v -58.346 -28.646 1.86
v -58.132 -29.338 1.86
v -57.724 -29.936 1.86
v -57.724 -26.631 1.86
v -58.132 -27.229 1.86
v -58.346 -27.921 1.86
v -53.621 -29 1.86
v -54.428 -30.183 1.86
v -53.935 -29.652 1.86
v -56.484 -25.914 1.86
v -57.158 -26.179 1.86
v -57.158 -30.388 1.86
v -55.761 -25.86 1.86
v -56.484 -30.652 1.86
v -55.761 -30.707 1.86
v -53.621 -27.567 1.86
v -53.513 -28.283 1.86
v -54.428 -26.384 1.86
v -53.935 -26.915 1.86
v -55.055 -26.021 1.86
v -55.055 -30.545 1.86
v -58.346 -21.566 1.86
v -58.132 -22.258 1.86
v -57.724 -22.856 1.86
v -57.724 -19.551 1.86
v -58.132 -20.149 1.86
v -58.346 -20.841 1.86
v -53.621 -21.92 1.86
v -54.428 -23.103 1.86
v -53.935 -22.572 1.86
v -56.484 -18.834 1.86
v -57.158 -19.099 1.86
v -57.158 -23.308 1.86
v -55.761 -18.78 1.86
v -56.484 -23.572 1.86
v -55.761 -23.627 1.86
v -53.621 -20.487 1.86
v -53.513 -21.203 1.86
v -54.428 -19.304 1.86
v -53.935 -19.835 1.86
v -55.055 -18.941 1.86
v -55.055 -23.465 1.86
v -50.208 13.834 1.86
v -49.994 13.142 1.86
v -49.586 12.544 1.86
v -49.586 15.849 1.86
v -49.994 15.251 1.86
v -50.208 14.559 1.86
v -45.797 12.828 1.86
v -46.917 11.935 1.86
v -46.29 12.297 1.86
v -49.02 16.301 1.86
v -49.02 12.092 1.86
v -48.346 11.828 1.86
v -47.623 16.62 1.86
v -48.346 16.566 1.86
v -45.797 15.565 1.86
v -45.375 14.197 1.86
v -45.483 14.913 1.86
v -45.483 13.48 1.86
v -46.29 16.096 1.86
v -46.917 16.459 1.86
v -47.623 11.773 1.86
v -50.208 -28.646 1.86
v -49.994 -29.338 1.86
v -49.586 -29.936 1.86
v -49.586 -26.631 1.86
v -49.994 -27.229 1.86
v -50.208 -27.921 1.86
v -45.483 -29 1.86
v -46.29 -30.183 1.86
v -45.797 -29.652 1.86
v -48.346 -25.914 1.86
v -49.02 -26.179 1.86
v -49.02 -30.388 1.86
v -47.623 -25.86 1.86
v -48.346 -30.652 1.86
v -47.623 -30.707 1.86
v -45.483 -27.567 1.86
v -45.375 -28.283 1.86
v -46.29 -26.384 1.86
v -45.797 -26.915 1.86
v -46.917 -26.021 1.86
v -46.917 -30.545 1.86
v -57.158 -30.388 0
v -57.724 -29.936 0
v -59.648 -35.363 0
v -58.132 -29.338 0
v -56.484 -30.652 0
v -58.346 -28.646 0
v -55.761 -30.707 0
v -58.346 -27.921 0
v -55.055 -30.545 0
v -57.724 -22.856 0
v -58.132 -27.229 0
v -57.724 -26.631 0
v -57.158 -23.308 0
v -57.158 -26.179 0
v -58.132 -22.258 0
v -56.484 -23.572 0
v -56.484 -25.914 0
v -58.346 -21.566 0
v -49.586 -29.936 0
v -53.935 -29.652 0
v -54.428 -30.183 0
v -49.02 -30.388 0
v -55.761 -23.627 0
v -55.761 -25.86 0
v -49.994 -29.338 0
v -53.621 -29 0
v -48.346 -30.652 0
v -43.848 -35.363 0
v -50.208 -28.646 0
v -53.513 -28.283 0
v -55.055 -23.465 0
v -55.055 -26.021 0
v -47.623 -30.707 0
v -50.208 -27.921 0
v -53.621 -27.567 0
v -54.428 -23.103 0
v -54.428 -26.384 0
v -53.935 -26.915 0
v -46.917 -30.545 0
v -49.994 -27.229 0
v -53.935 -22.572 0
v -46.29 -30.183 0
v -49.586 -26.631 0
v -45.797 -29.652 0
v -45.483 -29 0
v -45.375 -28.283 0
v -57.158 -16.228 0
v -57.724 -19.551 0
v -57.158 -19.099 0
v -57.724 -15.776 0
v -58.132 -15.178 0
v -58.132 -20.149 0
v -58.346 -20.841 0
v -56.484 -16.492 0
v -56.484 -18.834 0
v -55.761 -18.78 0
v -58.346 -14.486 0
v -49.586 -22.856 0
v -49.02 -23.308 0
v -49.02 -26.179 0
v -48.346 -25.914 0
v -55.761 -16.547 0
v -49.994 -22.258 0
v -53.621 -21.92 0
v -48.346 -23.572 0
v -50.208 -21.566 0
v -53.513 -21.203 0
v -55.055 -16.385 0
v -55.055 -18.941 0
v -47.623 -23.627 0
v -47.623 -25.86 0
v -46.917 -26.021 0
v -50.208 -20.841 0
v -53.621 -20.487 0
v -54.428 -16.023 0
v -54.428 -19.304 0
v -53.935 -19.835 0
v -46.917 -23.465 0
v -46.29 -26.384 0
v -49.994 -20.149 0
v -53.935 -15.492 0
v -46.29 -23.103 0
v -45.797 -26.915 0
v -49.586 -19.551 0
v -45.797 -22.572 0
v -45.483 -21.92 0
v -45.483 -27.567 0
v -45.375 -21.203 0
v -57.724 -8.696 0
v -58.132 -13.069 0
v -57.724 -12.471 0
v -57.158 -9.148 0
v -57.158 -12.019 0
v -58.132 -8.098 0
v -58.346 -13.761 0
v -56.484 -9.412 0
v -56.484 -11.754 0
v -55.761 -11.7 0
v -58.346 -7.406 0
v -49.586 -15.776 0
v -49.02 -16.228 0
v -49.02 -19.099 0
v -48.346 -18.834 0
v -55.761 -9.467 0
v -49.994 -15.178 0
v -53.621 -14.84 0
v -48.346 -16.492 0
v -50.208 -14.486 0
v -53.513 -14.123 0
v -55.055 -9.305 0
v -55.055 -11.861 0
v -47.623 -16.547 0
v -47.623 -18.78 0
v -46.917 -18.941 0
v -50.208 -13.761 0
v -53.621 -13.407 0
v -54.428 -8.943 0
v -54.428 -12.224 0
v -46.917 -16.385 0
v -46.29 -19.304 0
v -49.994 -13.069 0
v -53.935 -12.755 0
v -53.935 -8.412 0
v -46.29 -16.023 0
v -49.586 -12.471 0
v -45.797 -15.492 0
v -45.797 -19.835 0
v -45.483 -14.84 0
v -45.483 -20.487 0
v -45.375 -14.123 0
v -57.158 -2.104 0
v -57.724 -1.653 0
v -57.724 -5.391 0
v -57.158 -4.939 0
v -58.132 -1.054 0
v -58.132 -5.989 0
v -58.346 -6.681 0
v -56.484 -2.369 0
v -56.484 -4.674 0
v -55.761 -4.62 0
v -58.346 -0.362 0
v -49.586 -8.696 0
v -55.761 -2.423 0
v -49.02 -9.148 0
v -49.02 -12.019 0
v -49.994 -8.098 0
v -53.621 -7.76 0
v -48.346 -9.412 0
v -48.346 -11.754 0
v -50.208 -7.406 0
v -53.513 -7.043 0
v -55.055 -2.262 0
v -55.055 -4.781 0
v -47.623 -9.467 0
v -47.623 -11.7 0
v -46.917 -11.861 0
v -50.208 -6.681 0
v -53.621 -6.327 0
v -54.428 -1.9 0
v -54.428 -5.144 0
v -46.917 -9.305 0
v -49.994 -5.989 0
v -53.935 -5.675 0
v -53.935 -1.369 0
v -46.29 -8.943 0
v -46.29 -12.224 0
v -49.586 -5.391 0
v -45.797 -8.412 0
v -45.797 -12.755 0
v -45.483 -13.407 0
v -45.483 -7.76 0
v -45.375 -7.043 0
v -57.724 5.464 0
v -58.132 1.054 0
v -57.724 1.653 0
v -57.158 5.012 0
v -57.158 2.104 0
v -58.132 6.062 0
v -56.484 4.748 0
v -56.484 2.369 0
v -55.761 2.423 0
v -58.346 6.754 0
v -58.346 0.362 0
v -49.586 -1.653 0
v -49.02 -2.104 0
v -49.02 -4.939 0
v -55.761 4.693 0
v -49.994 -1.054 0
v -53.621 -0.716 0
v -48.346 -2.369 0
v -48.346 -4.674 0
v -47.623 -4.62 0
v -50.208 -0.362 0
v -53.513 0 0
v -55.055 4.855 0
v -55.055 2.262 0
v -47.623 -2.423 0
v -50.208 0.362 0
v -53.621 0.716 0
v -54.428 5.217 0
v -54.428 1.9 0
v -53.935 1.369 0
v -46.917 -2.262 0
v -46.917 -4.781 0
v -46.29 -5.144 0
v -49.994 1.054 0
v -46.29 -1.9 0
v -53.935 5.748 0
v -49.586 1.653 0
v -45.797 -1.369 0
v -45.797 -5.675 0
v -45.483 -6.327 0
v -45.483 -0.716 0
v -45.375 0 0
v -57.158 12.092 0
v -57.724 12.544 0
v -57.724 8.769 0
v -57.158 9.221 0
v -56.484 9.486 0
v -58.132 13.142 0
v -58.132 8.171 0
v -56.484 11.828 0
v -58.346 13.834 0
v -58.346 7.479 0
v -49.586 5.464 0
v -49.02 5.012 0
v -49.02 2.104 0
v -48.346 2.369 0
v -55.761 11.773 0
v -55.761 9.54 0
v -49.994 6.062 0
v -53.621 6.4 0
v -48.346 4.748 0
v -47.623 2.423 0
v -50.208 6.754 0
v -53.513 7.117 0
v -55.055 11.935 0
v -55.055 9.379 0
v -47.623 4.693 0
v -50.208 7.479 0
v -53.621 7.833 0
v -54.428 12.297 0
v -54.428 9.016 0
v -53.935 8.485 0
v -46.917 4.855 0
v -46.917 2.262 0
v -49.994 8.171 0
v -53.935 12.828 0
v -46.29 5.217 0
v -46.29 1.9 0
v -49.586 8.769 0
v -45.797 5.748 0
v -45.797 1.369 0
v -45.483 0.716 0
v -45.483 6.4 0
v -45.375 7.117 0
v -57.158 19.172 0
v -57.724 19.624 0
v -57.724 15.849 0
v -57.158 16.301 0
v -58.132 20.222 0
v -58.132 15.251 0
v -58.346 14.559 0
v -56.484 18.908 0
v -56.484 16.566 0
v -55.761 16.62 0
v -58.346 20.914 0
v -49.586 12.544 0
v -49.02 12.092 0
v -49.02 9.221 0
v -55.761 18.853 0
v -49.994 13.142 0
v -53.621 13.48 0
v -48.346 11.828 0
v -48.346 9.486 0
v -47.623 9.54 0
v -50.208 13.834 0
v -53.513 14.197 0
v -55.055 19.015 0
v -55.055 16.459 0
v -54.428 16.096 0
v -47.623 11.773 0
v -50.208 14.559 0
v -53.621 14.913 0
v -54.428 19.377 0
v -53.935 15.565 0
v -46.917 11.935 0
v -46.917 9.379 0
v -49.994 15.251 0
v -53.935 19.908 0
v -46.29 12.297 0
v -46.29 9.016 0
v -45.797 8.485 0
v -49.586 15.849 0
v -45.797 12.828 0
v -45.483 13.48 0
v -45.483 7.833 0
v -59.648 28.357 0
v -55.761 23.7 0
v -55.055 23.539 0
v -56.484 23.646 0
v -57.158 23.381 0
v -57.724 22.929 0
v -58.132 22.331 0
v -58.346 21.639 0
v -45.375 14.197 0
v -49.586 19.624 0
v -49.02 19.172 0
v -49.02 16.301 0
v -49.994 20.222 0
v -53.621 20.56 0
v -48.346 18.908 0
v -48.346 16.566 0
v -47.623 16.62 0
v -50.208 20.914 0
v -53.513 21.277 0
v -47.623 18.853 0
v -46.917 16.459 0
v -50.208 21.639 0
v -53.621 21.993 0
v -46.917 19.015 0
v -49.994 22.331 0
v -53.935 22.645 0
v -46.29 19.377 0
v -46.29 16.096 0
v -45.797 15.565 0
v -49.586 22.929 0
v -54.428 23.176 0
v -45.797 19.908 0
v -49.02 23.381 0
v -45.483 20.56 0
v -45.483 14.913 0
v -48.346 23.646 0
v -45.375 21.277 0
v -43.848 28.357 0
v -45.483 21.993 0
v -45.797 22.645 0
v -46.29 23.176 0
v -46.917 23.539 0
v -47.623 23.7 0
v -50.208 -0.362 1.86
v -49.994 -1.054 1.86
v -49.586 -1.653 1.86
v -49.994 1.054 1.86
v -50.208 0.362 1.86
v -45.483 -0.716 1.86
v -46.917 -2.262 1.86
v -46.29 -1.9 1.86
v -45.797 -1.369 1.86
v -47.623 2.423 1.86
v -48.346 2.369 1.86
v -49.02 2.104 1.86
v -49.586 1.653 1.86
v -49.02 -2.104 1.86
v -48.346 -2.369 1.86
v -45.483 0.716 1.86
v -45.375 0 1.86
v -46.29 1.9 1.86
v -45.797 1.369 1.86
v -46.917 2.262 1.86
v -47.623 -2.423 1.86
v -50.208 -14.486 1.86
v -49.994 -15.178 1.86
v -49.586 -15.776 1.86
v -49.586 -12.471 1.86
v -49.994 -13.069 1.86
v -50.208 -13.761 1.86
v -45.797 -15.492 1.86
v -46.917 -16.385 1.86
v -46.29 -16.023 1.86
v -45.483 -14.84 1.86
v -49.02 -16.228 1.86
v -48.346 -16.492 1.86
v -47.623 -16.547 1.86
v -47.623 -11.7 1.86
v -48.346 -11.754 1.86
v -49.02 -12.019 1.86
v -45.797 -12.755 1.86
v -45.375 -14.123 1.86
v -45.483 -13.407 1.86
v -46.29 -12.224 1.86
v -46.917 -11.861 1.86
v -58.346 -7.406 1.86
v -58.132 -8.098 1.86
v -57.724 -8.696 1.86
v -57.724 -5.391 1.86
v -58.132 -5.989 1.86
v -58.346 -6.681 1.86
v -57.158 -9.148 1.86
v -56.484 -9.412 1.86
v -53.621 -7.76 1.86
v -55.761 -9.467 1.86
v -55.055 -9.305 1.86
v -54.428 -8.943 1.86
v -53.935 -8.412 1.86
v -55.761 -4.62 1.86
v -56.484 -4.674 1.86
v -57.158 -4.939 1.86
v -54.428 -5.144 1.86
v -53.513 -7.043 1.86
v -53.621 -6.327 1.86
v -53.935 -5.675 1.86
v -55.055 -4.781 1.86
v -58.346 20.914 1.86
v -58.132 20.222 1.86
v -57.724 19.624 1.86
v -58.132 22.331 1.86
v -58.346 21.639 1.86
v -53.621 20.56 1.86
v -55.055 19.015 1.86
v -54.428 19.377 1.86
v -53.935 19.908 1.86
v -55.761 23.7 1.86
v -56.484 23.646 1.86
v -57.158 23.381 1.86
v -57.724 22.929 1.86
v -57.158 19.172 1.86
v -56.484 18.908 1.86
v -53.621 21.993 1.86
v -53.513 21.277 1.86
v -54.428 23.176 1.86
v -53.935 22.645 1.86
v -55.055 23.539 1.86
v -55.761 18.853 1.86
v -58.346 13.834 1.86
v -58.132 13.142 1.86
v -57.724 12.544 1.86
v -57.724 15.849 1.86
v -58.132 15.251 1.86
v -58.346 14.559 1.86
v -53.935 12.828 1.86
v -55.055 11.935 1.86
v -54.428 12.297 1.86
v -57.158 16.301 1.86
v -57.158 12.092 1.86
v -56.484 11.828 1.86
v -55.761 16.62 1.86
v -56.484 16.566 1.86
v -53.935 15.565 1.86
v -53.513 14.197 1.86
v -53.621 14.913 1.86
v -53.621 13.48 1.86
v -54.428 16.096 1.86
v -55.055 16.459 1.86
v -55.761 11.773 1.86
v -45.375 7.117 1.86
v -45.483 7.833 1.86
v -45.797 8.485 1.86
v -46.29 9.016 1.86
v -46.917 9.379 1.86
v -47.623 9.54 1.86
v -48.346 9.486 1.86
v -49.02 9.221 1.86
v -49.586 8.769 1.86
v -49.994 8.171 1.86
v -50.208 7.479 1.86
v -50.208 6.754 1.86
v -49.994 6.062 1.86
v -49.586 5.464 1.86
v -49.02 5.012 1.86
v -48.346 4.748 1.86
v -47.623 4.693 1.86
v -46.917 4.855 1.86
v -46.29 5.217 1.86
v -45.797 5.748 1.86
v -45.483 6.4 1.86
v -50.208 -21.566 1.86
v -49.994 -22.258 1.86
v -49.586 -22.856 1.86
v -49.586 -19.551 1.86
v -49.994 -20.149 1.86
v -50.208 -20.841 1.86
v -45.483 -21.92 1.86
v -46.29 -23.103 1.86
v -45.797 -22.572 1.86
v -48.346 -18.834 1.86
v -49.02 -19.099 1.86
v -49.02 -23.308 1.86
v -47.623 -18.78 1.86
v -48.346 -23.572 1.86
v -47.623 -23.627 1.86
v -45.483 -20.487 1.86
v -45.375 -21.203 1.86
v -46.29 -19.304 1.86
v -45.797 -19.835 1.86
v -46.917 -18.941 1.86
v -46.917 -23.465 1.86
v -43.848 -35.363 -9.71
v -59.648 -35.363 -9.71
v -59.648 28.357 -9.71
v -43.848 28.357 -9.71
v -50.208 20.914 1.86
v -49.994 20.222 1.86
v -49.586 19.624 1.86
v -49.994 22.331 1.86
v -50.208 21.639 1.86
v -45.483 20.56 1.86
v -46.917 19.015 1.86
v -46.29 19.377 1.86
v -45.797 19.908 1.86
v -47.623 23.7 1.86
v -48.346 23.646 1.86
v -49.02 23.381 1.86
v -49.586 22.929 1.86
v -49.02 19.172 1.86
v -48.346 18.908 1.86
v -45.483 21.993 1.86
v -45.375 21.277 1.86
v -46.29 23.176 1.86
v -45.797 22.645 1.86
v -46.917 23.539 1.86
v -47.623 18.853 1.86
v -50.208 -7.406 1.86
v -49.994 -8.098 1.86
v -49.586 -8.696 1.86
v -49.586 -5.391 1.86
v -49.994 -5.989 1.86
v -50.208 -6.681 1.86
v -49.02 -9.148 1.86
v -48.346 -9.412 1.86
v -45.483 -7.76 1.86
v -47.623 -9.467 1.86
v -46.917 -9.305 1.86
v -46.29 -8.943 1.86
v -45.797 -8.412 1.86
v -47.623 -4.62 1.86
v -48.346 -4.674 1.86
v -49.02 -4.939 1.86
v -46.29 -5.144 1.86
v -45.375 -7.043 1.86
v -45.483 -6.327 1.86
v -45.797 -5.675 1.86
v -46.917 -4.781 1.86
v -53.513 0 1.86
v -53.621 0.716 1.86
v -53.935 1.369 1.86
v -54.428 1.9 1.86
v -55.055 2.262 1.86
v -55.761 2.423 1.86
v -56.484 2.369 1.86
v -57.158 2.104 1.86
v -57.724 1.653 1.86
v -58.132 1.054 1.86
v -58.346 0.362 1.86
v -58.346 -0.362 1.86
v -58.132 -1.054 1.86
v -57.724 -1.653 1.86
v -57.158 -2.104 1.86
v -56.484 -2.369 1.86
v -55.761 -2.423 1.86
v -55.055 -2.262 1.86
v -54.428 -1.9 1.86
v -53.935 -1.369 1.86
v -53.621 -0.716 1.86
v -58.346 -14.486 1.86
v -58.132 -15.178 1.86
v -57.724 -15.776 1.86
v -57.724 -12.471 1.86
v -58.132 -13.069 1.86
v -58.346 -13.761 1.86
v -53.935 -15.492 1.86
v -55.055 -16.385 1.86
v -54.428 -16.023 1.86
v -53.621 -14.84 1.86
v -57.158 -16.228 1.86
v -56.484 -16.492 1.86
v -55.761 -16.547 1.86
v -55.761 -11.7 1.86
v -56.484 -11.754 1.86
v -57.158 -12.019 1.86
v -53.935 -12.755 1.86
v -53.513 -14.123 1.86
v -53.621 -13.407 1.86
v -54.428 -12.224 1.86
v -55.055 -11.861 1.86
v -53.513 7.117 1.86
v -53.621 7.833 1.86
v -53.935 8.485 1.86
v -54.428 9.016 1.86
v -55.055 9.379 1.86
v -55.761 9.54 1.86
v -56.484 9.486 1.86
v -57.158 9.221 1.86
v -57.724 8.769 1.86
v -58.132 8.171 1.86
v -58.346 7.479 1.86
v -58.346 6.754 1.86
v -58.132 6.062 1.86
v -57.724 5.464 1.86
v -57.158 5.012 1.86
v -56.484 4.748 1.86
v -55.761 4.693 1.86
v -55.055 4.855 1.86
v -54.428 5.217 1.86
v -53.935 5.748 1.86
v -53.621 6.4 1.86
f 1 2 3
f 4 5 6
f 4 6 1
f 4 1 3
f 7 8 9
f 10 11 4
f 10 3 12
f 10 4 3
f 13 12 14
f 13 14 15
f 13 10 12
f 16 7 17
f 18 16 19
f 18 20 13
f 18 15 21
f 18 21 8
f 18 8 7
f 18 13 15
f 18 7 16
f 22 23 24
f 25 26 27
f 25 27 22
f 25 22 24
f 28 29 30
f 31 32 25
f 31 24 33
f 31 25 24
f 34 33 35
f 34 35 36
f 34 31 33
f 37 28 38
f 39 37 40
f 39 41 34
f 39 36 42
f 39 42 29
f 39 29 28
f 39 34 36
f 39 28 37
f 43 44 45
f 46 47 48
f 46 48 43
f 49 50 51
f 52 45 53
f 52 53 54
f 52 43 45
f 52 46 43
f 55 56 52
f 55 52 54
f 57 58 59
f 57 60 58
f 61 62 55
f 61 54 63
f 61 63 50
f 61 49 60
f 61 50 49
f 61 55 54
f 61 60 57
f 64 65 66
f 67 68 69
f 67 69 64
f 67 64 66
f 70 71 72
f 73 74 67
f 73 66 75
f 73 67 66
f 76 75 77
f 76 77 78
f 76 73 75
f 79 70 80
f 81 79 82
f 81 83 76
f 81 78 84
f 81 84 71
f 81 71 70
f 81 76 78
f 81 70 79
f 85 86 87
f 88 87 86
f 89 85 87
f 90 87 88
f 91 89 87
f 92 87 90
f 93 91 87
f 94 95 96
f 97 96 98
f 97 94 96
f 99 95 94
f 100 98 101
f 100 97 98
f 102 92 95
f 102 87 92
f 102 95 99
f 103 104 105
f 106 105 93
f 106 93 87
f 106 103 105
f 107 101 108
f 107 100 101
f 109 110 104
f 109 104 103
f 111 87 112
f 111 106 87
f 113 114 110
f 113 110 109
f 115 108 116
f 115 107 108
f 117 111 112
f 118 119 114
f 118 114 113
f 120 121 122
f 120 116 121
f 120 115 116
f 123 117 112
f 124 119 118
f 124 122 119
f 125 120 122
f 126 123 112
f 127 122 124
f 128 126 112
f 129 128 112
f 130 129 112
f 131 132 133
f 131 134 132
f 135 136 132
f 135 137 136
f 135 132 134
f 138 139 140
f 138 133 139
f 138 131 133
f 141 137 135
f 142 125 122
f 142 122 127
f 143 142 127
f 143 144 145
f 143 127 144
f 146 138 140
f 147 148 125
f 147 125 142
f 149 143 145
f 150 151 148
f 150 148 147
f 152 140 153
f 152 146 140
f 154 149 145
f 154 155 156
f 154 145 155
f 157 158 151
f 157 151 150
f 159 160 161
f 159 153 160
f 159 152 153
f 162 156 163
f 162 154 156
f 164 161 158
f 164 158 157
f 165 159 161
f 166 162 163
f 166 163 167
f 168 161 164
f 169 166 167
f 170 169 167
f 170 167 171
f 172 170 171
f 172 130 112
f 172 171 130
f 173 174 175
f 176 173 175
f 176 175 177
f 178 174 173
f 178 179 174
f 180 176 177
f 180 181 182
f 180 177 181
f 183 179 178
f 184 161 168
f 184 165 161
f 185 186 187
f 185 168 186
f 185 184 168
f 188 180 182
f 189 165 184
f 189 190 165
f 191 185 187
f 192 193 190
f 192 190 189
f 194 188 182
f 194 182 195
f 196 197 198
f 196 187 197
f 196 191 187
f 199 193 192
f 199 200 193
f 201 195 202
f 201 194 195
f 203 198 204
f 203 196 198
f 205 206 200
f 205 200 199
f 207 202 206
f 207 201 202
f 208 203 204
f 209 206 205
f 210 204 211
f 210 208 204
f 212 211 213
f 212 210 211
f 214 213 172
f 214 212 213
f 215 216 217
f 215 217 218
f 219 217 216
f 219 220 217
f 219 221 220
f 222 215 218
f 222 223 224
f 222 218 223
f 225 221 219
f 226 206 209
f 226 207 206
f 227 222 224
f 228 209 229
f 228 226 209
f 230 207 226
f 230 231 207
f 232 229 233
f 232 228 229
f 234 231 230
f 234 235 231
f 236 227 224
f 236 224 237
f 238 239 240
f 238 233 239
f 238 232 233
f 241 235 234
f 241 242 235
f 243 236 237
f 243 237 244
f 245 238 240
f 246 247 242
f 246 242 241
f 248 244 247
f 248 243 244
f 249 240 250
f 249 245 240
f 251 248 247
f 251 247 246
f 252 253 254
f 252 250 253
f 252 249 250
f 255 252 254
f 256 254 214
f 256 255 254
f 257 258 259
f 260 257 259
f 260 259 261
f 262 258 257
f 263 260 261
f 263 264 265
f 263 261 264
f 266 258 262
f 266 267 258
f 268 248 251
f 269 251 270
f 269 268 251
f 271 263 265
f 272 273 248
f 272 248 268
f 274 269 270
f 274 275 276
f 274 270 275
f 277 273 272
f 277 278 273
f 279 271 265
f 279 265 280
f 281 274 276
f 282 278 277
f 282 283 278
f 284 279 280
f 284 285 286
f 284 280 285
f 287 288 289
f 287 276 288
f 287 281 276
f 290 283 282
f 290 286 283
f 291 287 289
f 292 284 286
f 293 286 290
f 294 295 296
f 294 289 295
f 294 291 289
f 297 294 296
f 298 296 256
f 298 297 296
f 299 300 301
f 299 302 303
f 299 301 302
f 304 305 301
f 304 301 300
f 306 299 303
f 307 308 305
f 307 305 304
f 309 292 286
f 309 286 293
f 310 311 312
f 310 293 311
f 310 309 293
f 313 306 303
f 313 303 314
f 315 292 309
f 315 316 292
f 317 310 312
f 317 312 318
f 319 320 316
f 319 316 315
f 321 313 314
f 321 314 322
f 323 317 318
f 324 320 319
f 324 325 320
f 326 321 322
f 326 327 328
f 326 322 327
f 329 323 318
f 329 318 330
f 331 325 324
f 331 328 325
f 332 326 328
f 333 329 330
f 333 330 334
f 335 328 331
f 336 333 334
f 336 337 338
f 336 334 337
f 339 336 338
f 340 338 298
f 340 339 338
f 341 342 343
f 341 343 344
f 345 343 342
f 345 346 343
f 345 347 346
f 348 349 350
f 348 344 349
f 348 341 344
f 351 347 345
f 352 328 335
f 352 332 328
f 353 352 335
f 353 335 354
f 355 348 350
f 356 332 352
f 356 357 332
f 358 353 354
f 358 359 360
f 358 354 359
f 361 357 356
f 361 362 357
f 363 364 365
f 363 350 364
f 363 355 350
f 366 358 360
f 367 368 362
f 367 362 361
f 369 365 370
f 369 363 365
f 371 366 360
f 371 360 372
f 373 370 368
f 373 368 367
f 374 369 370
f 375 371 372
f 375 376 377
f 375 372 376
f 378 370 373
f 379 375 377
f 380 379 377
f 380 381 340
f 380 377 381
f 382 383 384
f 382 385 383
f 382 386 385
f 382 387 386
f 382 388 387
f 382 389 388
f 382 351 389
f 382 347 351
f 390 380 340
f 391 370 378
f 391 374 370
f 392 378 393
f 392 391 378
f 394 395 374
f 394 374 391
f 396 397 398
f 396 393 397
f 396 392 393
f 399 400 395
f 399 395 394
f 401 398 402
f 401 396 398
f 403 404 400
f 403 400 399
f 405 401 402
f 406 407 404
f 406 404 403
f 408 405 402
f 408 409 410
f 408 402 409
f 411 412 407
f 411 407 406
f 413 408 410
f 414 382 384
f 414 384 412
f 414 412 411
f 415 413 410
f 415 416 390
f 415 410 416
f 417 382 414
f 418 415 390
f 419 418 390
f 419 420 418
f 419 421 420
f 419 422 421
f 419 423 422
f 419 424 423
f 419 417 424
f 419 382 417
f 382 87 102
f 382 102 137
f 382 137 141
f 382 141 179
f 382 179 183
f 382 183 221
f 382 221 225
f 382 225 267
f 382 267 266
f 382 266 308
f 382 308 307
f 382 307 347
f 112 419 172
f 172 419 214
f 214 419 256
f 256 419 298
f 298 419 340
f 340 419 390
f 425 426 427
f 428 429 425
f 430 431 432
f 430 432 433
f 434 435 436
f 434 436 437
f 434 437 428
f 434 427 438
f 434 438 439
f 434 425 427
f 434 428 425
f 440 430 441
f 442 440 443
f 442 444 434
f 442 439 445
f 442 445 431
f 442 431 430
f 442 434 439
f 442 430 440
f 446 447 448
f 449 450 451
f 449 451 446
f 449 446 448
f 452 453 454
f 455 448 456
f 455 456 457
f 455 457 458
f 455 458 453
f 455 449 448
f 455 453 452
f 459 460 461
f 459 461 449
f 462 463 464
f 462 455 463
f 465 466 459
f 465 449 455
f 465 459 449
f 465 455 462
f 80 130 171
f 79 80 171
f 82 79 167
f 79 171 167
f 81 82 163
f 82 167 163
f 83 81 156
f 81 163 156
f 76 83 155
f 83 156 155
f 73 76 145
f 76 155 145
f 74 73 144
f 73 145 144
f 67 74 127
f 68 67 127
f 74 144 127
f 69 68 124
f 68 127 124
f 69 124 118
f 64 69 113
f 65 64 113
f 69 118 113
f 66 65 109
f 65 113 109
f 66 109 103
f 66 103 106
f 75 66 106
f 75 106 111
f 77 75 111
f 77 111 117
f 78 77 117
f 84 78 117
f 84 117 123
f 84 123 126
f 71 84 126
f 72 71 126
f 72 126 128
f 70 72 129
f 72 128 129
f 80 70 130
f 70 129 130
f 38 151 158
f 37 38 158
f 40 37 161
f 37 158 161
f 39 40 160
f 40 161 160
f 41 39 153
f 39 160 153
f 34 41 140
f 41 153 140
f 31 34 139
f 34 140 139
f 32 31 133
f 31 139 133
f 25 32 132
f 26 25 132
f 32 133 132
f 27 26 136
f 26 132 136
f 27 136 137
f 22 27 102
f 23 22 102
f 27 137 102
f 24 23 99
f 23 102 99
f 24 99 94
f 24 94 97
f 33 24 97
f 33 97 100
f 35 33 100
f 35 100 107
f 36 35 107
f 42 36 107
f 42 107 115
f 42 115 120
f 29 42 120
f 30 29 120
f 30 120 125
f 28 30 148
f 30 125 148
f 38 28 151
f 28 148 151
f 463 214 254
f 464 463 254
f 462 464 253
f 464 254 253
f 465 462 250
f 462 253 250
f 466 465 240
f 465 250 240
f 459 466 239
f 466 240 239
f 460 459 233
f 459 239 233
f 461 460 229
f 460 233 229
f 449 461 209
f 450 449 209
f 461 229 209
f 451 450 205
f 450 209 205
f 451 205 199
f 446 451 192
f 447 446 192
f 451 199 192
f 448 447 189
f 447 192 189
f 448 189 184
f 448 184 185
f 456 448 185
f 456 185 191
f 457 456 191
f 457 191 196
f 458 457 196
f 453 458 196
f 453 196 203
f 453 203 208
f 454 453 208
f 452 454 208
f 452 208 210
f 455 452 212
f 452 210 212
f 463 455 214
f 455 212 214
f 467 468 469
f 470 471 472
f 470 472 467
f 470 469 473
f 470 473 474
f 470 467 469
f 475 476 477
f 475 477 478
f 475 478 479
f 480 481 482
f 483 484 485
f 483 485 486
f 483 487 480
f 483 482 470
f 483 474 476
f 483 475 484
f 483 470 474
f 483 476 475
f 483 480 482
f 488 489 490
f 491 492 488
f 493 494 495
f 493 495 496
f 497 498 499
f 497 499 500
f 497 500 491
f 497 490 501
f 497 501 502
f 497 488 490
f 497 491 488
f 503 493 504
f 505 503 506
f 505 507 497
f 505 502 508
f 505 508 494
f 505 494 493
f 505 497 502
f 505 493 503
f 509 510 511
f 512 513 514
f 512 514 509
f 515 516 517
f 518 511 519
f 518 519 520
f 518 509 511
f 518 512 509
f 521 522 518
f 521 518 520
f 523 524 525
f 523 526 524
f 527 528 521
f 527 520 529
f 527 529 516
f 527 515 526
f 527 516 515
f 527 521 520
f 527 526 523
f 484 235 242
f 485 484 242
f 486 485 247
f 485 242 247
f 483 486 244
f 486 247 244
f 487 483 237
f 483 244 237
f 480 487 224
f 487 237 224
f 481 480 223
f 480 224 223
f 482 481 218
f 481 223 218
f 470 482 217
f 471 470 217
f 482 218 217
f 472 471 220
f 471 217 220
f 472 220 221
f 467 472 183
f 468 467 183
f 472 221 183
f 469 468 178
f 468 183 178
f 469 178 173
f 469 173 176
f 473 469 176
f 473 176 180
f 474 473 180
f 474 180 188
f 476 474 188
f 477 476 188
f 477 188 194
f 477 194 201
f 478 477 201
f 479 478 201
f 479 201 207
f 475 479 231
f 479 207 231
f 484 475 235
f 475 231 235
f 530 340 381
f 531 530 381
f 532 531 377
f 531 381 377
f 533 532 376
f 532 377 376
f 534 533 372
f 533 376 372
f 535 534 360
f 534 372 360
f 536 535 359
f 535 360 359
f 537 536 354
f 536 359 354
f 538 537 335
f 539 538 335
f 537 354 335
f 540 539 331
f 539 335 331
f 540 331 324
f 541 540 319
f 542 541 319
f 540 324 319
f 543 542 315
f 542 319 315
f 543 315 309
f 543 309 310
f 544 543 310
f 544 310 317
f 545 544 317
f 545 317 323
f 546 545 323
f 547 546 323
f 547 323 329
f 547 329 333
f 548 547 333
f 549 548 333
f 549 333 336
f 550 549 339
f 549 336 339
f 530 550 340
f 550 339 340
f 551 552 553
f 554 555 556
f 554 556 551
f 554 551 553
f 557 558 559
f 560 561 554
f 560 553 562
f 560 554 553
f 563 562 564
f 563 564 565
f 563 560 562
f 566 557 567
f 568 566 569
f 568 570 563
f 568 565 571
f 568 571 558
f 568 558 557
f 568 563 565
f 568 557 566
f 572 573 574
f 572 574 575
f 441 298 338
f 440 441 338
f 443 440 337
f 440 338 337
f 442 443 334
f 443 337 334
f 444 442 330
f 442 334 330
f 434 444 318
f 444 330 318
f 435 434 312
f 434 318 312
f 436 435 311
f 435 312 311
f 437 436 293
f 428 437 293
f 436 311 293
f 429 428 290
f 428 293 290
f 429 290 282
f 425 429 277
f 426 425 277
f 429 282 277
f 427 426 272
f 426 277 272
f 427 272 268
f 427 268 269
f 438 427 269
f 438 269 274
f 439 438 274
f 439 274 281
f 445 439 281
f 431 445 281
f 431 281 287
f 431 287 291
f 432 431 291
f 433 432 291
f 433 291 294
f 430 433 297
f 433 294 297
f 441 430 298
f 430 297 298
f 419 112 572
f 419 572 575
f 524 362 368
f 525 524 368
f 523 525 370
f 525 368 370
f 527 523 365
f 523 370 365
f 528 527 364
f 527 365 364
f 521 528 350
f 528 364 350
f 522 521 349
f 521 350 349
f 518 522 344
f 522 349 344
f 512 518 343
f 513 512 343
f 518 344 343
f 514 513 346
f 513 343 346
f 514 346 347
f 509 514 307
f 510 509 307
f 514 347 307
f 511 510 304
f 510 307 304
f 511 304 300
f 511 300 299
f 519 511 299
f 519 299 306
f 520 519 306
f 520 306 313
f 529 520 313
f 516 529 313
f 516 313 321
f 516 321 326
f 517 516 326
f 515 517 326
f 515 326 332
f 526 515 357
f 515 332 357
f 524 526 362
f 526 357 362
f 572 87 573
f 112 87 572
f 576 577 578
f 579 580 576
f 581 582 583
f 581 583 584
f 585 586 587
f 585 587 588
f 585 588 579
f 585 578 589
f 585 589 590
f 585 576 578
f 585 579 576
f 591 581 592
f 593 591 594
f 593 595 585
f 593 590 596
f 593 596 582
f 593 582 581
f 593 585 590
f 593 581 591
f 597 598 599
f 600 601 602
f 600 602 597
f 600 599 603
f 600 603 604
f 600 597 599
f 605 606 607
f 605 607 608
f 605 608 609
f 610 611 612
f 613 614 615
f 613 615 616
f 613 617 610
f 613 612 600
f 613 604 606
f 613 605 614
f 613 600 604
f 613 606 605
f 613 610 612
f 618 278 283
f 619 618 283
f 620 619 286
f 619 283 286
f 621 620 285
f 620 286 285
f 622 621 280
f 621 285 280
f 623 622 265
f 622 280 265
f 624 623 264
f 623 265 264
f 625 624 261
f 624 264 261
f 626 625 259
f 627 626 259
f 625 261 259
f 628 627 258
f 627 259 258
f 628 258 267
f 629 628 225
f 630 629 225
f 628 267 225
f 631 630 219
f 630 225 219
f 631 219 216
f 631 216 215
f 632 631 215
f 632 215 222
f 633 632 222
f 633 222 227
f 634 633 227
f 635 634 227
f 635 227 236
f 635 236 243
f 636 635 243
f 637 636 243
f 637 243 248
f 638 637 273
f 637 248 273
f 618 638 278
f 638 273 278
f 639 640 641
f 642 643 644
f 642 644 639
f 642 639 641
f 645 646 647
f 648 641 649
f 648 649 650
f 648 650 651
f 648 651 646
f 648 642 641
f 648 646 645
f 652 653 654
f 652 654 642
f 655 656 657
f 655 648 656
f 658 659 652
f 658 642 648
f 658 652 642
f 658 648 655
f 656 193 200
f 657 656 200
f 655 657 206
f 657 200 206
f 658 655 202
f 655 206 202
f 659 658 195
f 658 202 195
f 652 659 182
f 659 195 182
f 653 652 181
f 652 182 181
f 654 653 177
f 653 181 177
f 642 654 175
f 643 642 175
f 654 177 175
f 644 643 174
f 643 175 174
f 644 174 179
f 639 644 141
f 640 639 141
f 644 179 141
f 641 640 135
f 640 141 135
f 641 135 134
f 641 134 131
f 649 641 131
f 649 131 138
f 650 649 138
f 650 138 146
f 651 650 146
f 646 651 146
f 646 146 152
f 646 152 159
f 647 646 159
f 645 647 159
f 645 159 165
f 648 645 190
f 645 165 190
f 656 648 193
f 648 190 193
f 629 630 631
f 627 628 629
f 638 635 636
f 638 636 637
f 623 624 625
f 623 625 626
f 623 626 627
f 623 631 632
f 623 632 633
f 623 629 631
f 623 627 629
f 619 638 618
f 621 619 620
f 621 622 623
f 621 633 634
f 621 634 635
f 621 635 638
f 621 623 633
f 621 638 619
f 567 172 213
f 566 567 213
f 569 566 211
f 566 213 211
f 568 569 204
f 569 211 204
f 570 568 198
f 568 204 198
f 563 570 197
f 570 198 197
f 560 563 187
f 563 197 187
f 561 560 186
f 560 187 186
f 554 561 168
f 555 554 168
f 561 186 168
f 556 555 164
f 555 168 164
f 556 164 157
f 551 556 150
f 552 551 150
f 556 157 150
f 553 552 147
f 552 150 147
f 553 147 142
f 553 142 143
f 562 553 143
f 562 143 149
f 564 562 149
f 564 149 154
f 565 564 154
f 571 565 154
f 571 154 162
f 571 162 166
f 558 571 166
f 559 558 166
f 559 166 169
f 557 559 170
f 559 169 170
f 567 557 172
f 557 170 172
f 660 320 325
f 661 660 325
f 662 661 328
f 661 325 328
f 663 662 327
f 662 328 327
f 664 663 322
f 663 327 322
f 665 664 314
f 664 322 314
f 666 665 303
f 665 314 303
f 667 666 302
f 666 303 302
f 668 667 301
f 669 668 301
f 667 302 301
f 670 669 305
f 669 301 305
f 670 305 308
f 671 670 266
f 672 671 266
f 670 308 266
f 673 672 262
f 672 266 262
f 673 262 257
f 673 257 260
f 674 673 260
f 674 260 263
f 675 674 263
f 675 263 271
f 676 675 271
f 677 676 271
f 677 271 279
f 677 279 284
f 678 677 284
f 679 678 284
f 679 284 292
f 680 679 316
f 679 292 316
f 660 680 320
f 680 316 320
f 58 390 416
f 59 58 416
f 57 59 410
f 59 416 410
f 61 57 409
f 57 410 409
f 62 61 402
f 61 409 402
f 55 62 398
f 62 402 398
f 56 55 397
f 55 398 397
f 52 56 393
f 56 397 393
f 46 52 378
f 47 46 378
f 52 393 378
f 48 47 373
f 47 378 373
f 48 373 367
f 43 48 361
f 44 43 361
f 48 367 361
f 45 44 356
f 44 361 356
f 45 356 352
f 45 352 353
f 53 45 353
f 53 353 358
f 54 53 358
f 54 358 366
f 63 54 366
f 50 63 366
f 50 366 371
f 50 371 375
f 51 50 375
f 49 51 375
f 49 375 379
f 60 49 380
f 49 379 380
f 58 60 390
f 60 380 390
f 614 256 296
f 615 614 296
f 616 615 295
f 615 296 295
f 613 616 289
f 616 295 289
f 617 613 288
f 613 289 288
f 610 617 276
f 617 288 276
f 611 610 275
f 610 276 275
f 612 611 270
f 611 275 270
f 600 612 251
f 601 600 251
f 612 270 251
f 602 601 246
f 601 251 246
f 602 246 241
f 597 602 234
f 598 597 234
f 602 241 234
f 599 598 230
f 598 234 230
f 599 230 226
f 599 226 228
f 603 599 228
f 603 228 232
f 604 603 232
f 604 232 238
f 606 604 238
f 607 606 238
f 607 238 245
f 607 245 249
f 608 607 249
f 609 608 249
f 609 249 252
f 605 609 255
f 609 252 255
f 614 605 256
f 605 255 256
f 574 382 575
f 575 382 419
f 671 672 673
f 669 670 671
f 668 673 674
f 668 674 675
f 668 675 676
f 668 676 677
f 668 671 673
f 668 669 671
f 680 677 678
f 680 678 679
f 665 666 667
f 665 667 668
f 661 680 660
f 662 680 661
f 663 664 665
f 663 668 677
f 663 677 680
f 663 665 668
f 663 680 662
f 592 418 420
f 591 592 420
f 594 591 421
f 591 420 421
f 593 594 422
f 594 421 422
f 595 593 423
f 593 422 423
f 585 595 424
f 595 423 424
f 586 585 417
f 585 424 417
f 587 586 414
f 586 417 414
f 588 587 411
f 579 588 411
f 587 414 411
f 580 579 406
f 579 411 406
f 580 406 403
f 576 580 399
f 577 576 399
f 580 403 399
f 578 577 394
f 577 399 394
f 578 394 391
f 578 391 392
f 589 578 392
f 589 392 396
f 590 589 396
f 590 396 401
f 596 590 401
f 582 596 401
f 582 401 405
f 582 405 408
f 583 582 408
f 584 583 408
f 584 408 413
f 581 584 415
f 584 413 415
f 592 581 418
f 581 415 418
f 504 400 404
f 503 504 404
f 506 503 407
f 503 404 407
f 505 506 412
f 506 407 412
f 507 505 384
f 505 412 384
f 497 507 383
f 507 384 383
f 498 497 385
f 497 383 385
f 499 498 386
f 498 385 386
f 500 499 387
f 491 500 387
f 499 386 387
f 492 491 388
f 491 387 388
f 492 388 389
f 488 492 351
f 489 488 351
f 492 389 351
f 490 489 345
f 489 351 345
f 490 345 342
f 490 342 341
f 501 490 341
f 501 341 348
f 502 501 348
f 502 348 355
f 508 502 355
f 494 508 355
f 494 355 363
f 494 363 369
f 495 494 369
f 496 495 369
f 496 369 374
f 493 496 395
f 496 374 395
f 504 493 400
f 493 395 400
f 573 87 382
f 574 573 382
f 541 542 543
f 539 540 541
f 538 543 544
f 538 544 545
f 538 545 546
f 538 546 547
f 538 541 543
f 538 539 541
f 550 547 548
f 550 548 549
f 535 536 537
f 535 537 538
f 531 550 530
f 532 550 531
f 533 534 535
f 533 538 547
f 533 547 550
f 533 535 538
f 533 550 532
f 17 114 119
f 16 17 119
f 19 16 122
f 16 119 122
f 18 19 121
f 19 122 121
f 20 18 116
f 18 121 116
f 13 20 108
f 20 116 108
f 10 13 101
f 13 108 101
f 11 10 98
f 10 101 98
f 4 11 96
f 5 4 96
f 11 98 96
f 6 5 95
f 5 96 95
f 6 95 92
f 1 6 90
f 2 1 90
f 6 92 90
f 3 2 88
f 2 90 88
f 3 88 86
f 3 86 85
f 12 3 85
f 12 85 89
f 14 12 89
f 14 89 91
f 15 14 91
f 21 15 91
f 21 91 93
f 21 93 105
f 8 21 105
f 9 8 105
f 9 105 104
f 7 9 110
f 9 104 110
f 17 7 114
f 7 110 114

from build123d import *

# Parameters (mm, degrees)
F0_W     = 15.8
F0_H     = 63.72
F0_R     = 2.43
F1_DEPTH = 9.71
F2_DEPTH = 1.86


with BuildPart() as f1:
    # F0 (on Top) → F1 (new body)
    with BuildSketch(Plane.XY):
        with Locations((-51.7484200151, -3.5033859313)):
            Rectangle(F0_W, F0_H)
        with Locations((-55.9428147972, -28.2833859313)):
            Circle(F0_R, mode=Mode.SUBTRACT)
        with Locations((-55.9428147972, -21.2033859313)):
            Circle(F0_R, mode=Mode.SUBTRACT)
        with Locations((-55.9428147972, -14.1233859313)):
            Circle(F0_R, mode=Mode.SUBTRACT)
        with Locations((-55.9428147972, -7.0433859313)):
            Circle(F0_R, mode=Mode.SUBTRACT)
        with Locations((-47.8049702942, -28.2833859313)):
            Circle(F0_R, mode=Mode.SUBTRACT)
        with Locations((-47.8049702942, -21.2033859313)):
            Circle(F0_R, mode=Mode.SUBTRACT)
        with Locations((-47.8049702942, -14.1233859313)):
            Circle(F0_R, mode=Mode.SUBTRACT)
        with Locations((-47.8049702942, -7.0433859313)):
            Circle(F0_R, mode=Mode.SUBTRACT)
        with Locations((-55.9428147972, 0)):
            Circle(F0_R, mode=Mode.SUBTRACT)
        with Locations((-55.9428147972, 7.1166140687)):
            Circle(F0_R, mode=Mode.SUBTRACT)
        with Locations((-55.9428147972, 14.1966140687)):
            Circle(F0_R, mode=Mode.SUBTRACT)
        with Locations((-55.9428147972, 21.2766140687)):
            Circle(F0_R, mode=Mode.SUBTRACT)
        with Locations((-47.8049702942, 0)):
            Circle(F0_R, mode=Mode.SUBTRACT)
        with Locations((-47.8049702942, 7.1166140687)):
            Circle(F0_R, mode=Mode.SUBTRACT)
        with Locations((-47.8049702942, 14.1966140687)):
            Circle(F0_R, mode=Mode.SUBTRACT)
        with Locations((-47.8049702942, 21.2766140687)):
            Circle(F0_R, mode=Mode.SUBTRACT)
        with Locations((-55.9428147972, 21.2766140687)):
            Circle(F0_R)
        with Locations((-55.9428147972, 14.1966140687)):
            Circle(F0_R)
        with Locations((-55.9428147972, 7.1166140687)):
            Circle(F0_R)
        with Locations((-55.9428147972, 0)):
            Circle(F0_R)
        with Locations((-55.9428147972, -7.0433859313)):
            Circle(F0_R)
        with Locations((-55.9428147972, -14.1233859313)):
            Circle(F0_R)
        with Locations((-55.9428147972, -21.2033859313)):
            Circle(F0_R)
        with Locations((-55.9428147972, -28.2833859313)):
            Circle(F0_R)
        with Locations((-47.8049702942, -28.2833859313)):
            Circle(F0_R)
        with Locations((-47.8049702942, -21.2033859313)):
            Circle(F0_R)
        with Locations((-47.8049702942, -14.1233859313)):
            Circle(F0_R)
        with Locations((-47.8049702942, -7.0433859313)):
            Circle(F0_R)
        with Locations((-47.8049702942, 0)):
            Circle(F0_R)
        with Locations((-47.8049702942, 7.1166140687)):
            Circle(F0_R)
        with Locations((-47.8049702942, 14.1966140687)):
            Circle(F0_R)
        with Locations((-47.8049702942, 21.2766140687)):
            Circle(F0_R)
    extrude(amount=-F1_DEPTH)

    # F0 (on Top) → F2 (join)
    with BuildSketch(Plane.XY):
        with Locations((-55.9428147972, 21.2766140687)):
            Circle(F0_R)
        with Locations((-55.9428147972, 14.1966140687)):
            Circle(F0_R)
        with Locations((-55.9428147972, 7.1166140687)):
            Circle(F0_R)
        with Locations((-55.9428147972, 0)):
            Circle(F0_R)
        with Locations((-55.9428147972, -7.0433859313)):
            Circle(F0_R)
        with Locations((-55.9428147972, -14.1233859313)):
            Circle(F0_R)
        with Locations((-55.9428147972, -21.2033859313)):
            Circle(F0_R)
        with Locations((-55.9428147972, -28.2833859313)):
            Circle(F0_R)
        with Locations((-47.8049702942, -28.2833859313)):
            Circle(F0_R)
        with Locations((-47.8049702942, -21.2033859313)):
            Circle(F0_R)
        with Locations((-47.8049702942, -14.1233859313)):
            Circle(F0_R)
        with Locations((-47.8049702942, -7.0433859313)):
            Circle(F0_R)
        with Locations((-47.8049702942, 0)):
            Circle(F0_R)
        with Locations((-47.8049702942, 7.1166140687)):
            Circle(F0_R)
        with Locations((-47.8049702942, 14.1966140687)):
            Circle(F0_R)
        with Locations((-47.8049702942, 21.2766140687)):
            Circle(F0_R)
    extrude(amount=F2_DEPTH)


solid = f1.part
